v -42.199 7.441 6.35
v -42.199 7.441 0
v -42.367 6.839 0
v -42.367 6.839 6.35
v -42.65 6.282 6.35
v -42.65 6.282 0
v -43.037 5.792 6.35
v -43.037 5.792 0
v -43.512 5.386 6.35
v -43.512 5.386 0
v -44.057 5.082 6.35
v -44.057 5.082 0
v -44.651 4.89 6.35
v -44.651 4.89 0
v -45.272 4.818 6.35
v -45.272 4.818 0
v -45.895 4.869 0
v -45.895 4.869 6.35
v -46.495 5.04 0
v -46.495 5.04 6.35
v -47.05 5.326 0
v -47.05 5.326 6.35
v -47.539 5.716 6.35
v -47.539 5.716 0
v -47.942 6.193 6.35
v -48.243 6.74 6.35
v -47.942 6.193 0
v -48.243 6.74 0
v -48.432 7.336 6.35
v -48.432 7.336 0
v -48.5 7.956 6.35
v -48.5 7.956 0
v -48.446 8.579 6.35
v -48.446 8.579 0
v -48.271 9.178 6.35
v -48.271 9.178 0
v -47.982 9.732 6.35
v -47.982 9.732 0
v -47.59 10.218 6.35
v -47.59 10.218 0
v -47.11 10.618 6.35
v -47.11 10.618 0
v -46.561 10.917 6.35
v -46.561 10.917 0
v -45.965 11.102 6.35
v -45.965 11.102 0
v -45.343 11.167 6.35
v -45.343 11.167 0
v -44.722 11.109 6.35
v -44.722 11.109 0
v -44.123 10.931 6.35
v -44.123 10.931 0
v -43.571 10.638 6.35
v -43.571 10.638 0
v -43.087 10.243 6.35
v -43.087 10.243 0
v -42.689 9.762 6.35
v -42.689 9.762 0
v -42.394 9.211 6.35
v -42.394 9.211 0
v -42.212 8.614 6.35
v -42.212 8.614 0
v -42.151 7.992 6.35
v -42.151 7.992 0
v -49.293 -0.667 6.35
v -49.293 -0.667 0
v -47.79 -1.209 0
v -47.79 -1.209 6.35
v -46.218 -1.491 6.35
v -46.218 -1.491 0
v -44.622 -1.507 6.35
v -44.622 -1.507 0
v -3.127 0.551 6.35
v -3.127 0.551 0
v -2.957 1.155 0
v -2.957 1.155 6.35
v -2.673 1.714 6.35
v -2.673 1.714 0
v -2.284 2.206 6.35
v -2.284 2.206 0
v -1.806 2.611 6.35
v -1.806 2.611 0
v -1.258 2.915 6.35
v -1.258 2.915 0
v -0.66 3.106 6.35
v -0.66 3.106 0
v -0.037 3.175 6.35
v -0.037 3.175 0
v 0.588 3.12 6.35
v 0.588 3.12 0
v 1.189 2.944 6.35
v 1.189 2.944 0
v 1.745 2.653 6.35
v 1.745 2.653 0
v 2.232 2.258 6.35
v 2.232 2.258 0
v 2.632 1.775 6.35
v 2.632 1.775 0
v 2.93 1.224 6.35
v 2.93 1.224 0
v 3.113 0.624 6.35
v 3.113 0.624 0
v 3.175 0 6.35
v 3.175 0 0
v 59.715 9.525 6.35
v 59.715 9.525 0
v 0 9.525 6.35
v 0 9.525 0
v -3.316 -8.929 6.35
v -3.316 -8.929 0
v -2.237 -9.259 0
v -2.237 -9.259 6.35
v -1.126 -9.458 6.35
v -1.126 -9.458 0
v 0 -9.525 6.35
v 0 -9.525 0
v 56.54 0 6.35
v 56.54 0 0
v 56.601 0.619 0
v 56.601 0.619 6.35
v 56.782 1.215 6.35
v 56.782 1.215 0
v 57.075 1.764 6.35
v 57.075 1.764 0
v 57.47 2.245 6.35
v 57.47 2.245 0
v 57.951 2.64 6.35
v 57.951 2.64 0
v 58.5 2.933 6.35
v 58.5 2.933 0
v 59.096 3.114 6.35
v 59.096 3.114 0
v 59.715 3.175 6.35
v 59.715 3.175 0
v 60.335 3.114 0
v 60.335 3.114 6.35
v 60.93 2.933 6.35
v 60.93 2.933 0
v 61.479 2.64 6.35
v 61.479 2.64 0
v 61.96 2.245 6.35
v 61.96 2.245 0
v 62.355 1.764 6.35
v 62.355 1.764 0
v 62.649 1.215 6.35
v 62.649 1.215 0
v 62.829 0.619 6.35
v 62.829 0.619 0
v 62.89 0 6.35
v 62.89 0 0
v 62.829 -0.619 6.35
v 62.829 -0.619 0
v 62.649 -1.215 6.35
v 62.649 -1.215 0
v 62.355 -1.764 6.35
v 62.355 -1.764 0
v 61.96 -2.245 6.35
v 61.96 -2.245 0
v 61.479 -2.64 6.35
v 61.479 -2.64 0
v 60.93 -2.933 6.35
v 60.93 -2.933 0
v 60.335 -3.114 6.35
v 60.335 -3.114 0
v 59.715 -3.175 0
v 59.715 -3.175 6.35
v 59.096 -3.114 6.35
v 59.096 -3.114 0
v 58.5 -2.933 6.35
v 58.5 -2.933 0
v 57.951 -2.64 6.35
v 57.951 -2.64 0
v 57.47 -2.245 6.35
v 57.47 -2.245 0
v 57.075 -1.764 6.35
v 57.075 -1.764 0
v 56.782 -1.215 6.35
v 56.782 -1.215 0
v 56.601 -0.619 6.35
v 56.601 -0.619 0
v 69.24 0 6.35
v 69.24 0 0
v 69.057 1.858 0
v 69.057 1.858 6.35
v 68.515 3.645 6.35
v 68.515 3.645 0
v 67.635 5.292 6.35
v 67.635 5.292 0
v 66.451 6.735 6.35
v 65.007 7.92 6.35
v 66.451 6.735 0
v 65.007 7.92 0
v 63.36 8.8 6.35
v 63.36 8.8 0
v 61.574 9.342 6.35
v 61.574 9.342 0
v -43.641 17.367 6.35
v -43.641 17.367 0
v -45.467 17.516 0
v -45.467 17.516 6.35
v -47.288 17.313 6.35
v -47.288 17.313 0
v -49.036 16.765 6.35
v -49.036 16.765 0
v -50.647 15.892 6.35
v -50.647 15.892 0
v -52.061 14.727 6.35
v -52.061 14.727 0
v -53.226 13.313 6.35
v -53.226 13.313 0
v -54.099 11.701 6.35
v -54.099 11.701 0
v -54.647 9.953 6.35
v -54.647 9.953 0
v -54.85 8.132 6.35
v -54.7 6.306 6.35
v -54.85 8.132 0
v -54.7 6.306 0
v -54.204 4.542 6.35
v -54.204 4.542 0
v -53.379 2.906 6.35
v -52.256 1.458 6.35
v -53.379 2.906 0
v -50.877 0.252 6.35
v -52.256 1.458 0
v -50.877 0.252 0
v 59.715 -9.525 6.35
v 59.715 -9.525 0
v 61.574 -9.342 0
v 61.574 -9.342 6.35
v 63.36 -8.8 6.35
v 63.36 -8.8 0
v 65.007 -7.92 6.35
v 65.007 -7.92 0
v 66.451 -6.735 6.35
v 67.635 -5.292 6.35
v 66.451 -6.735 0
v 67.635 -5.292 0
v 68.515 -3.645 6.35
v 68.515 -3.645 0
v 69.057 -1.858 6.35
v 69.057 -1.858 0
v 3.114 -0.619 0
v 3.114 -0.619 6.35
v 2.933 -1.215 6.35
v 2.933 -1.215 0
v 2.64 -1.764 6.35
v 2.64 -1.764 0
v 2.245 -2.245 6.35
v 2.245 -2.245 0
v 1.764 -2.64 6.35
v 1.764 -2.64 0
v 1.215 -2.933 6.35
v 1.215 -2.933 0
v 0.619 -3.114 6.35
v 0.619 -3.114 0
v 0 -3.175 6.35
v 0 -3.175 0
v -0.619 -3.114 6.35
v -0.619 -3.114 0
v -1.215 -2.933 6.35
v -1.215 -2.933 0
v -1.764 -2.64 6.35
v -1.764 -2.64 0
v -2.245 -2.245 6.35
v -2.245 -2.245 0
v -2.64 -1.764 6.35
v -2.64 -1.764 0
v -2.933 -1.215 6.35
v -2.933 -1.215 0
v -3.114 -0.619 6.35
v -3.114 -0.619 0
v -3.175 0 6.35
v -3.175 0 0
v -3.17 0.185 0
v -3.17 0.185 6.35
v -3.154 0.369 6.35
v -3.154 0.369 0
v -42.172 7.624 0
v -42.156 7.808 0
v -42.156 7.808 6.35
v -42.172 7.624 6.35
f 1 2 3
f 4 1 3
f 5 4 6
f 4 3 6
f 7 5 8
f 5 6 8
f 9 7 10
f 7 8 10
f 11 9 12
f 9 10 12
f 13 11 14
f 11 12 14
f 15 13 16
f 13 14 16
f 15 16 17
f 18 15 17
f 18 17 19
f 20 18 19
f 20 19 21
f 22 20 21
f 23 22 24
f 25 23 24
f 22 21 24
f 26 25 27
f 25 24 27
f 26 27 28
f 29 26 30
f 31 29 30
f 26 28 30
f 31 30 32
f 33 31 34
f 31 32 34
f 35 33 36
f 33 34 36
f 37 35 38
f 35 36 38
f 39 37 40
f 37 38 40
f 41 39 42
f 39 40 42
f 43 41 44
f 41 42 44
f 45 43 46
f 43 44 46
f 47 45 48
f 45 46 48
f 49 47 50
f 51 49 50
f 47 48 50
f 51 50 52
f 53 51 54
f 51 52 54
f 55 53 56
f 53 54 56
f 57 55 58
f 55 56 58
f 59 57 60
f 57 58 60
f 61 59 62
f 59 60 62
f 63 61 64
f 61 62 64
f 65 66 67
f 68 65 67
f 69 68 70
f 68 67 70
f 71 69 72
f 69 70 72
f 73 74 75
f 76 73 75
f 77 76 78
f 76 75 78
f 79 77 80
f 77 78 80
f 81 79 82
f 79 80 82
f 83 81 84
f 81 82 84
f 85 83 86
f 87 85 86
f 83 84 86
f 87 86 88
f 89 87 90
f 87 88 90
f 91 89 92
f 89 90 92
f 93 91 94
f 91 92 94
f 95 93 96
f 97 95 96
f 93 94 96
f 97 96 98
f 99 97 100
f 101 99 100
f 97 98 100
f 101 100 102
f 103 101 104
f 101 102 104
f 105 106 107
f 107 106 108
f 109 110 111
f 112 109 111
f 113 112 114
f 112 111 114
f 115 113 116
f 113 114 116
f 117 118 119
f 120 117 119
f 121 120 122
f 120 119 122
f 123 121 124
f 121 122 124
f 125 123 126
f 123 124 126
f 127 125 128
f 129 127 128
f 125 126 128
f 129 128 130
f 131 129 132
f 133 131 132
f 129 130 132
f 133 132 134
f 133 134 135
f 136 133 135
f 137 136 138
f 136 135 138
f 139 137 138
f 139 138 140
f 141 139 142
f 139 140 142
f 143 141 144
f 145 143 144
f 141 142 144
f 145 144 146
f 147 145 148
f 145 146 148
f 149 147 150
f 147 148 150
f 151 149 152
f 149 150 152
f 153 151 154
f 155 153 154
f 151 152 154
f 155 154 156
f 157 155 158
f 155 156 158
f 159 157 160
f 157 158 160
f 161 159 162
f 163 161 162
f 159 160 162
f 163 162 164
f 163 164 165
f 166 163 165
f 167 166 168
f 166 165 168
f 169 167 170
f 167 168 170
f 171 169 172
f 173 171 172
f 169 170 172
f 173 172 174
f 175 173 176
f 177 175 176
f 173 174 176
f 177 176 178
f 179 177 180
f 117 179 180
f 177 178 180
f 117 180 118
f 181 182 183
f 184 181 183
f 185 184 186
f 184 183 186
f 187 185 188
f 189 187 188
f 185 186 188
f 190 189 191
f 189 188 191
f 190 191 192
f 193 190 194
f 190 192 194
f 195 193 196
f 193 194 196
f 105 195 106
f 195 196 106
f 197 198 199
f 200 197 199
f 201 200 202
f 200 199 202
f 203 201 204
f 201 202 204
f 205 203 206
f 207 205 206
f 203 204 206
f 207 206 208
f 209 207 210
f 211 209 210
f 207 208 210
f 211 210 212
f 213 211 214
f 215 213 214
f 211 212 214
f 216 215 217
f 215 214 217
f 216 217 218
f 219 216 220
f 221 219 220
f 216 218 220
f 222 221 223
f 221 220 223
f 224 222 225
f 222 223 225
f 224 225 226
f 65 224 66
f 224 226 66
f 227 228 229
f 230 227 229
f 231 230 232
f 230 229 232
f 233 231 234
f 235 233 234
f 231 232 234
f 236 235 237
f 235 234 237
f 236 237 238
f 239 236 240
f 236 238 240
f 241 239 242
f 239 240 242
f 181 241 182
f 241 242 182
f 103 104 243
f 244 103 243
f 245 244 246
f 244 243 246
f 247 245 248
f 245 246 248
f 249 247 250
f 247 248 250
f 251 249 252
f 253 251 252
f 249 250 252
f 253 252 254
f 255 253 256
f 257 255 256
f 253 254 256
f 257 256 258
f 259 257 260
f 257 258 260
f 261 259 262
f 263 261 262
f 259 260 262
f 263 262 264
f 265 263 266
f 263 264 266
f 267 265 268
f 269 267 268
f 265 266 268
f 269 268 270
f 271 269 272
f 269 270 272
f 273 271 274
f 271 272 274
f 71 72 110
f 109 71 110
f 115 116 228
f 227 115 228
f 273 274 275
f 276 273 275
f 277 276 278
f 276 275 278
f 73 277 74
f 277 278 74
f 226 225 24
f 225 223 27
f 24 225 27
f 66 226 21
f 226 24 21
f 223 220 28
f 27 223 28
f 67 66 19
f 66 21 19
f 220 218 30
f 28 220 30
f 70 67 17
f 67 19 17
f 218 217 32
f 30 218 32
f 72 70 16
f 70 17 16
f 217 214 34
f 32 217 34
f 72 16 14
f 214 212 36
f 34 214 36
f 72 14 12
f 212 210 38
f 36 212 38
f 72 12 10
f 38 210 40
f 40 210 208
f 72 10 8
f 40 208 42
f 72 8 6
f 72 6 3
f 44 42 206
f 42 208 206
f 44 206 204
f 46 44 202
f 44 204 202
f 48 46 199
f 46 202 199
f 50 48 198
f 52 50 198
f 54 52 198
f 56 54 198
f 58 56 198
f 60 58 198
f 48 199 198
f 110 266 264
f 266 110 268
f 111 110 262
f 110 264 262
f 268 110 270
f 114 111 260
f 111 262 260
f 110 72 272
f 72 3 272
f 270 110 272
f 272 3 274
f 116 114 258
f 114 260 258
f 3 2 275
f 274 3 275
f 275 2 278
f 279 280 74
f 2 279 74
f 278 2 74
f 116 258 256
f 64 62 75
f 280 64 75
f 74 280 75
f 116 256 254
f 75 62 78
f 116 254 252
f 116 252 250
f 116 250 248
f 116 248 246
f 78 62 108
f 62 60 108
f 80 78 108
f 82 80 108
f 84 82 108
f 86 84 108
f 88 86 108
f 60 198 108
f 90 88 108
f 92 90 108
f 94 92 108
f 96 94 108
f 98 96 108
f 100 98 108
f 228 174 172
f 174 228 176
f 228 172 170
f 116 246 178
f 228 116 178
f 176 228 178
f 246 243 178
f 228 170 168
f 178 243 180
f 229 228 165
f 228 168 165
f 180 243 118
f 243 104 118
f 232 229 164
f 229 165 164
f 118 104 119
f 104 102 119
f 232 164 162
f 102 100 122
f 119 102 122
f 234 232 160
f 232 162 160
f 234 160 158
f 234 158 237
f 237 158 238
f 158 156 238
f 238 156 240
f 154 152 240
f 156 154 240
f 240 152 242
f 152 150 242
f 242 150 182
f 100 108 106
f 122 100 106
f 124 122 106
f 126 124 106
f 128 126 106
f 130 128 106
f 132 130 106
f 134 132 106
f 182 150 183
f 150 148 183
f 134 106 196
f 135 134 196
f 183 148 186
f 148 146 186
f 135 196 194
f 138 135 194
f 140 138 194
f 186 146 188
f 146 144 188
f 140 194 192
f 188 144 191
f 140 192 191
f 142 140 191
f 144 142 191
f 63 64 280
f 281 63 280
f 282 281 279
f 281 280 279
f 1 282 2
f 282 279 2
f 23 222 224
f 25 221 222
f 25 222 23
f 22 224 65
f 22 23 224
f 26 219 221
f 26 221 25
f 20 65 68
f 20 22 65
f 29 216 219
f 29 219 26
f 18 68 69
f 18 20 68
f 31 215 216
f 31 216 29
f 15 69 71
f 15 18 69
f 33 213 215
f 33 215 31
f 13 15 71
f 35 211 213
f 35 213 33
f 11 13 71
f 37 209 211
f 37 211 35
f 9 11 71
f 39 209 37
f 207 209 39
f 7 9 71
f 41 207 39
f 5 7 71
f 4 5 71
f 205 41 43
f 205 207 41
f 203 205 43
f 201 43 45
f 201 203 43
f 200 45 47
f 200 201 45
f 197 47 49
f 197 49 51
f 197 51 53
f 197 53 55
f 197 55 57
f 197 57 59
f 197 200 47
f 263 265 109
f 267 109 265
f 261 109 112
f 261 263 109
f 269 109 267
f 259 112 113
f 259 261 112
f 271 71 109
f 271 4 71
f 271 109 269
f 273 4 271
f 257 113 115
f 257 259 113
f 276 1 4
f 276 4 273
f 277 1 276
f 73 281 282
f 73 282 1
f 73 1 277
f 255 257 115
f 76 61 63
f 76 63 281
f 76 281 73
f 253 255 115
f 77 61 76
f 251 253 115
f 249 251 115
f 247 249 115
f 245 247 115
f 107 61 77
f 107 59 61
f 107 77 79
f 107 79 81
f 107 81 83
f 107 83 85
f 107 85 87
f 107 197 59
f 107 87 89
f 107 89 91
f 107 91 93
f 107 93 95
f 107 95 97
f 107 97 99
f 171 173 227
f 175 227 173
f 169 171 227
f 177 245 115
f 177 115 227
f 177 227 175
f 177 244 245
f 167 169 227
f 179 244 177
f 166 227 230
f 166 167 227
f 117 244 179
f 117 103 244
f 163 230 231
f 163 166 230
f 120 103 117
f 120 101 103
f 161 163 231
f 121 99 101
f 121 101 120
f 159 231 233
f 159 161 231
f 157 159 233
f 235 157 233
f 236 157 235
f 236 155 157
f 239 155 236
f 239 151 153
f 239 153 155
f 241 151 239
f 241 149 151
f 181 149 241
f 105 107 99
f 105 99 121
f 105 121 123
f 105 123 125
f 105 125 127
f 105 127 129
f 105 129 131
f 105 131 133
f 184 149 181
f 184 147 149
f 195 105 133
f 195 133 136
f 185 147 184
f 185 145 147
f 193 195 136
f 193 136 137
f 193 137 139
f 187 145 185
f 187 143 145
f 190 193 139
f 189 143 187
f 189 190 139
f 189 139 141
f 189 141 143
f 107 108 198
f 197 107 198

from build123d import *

# Parameters (mm, degrees)
F1_DEPTH = 6.35


with BuildPart() as f1:
    # F0 (on Top) → F1 (new body)
    with BuildSketch(Plane.XY):
        with BuildLine():
            ThreePointArc((-3.1267646158, 0.5513329641), (0.2767194832, 3.1629181664), (3.175, 0))
            Line((3.175, 0), (9.525, 0))
            ThreePointArc((9.525, 0), (6.7351920908, 6.7351920908), (0, 9.525))
            ThreePointArc((0, 9.525), (-6.1225519823, 7.2965733207), (-9.3802938474, 1.6539988923))
            Line((-9.3802938474, 1.6539988923), (-3.1267646158, 0.5513329641))
        make_face()
        with BuildLine():
            Line((9.525, 0), (3.175, 0))
            ThreePointArc((3.175, 0), (0, -3.175), (-3.175, 0))
            Line((-3.175, 0), (-9.525, 0))
            ThreePointArc((-9.525, 0), (-7.8202053152, -5.4378317212), (-3.316073212, -8.9291255704))
            Line((-3.316073212, -8.9291255704), (0, -9.525))
            ThreePointArc((0, -9.525), (6.7351920908, -6.7351920908), (9.525, 0))
        make_face()
        with BuildLine():
            ThreePointArc((0, 9.525), (6.7351920908, 6.7351920908), (9.525, 0))
            Line((9.525, 0), (50.1904, 0))
            ThreePointArc((50.1904, 0), (52.9802079092, 6.7351920908), (59.7154, 9.525))
            Line((59.7154, 9.525), (0, 9.525))
        make_face()
        with BuildLine():
            Line((50.1904, 0), (9.525, 0))
            ThreePointArc((9.525, 0), (6.7351920908, -6.7351920908), (0, -9.525))
            Line((0, -9.525), (59.7154, -9.525))
            ThreePointArc((59.7154, -9.525), (52.9802079092, -6.7351920908), (50.1904, 0))
        make_face()
        with BuildLine():
            ThreePointArc((-3.316073212, -8.9291255704), (-7.8202053152, -5.4378317212), (-9.525, 0))
            Line((-9.525, 0), (-40.1437268637, 0))
            ThreePointArc((-40.1437268637, 0), (-42.2877419599, -1.0354554234), (-44.6215756209, -1.5068248214))
            Line((-44.6215756209, -1.5068248214), (-3.316073212, -8.9291255704))
        make_face()
        with BuildLine():
            Line((-35.9452860234, 6.3381237552), (-9.3802938474, 1.6539988923))
            ThreePointArc((-9.3802938474, 1.6539988923), (-6.1225519823, 7.2965733207), (0, 9.525))
            Line((0, 9.525), (-43.6409873472, 17.3669705411))
            ThreePointArc((-43.6409873472, 17.3669705411), (-38.0190290845, 14.1027642346), (-35.8005798708, 7.9921226475))
            ThreePointArc((-35.8005798708, 7.9921226475), (-35.8368253715, 7.1619641978), (-35.9452860234, 6.3381237552))
        make_face()
        with BuildLine():
            ThreePointArc((59.7154, 9.525), (52.9802079092, 6.7351920908), (50.1904, 0))
            ThreePointArc((50.1904, 0), (52.9802079092, -6.7351920908), (59.7154, -9.525))
            ThreePointArc((59.7154, -9.525), (66.4505920908, -6.7351920908), (69.2404, 0))
            ThreePointArc((69.2404, 0), (66.4505920908, 6.7351920908), (59.7154, 9.525))
        make_face()
        with BuildLine():
            ThreePointArc((62.8904, 0), (59.7154, -3.175), (56.5404, 0))
            ThreePointArc((56.5404, 0), (59.7154, 3.175), (62.8904, 0))
        make_face(mode=Mode.SUBTRACT)
        with BuildLine():
            ThreePointArc((-3.316073212, -8.9291255704), (-1.6845925237, -9.3748478937), (0, -9.525))
            Line((0, -9.525), (-3.316073212, -8.9291255704))
        make_face()
        with BuildLine():
            ThreePointArc((-44.6215756209, -1.5068248214), (-42.2877419599, -1.0354554234), (-40.1437268637, 0))
            ThreePointArc((-40.1437268637, 0), (-37.3847371298, 2.7320236406), (-35.9452860234, 6.3381237552))
            ThreePointArc((-35.9452860234, 6.3381237552), (-35.8368253715, 7.1619641978), (-35.8005798708, 7.9921226475))
            ThreePointArc((-35.8005798708, 7.9921226475), (-38.0190290845, 14.1027642346), (-43.6409873472, 17.3669705411))
            ThreePointArc((-43.6409873472, 17.3669705411), (-54.414733052, 10.8404413532), (-49.2925454975, -0.6674852372))
            Line((-49.2925454975, -0.6674852372), (-44.6215756209, -1.5068248214))
        make_face()
        with BuildLine():
            ThreePointArc((-42.1505798708, 7.9921226475), (-42.1626617044, 7.7154031643), (-42.198815255, 7.4407896834))
            ThreePointArc((-42.198815255, 7.4407896834), (-48.4884980373, 8.2688421307), (-42.1505798708, 7.9921226475))
        make_face(mode=Mode.SUBTRACT)
        with BuildLine():
            ThreePointArc((-49.2925454975, -0.6674852372), (-47.0101723945, -1.3827252462), (-44.6215756209, -1.5068248214))
            Line((-44.6215756209, -1.5068248214), (-49.2925454975, -0.6674852372))
        make_face()
        with BuildLine():
            Line((-40.1437268637, 0), (-9.525, 0))
            ThreePointArc((-9.525, 0), (-9.4887544993, 0.8301584497), (-9.3802938474, 1.6539988923))
            Line((-9.3802938474, 1.6539988923), (-35.9452860234, 6.3381237552))
            ThreePointArc((-35.9452860234, 6.3381237552), (-37.3847371298, 2.7320236406), (-40.1437268637, 0))
        make_face()
        with BuildLine():
            Line((-9.525, 0), (-3.175, 0))
            ThreePointArc((-3.175, 0), (-3.1629181664, 0.2767194832), (-3.1267646158, 0.5513329641))
            Line((-3.1267646158, 0.5513329641), (-9.3802938474, 1.6539988923))
            ThreePointArc((-9.3802938474, 1.6539988923), (-9.4887544993, 0.8301584497), (-9.525, 0))
        make_face()
    extrude(amount=F1_DEPTH)


solid = f1.part
